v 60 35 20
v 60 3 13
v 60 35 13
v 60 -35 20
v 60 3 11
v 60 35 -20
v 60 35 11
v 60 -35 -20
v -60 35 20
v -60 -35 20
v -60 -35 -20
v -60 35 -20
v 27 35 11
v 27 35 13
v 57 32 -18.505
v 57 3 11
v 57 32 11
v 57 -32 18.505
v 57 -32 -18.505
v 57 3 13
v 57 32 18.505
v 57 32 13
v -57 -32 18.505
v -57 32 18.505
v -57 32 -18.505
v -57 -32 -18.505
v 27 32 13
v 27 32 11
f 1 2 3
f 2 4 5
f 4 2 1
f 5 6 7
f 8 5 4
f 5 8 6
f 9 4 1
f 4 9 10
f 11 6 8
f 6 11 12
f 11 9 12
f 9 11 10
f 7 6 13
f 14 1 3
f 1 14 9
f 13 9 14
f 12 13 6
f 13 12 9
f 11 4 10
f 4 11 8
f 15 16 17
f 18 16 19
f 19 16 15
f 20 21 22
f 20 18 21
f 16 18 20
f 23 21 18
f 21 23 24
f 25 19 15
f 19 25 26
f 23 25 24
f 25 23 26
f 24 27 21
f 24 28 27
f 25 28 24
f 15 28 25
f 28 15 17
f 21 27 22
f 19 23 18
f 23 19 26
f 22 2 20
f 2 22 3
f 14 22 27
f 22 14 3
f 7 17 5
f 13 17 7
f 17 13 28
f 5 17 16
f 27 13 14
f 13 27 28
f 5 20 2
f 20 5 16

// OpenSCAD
// Buffer tank for mini horizontal gel-electrophoresis box
outer_X = 120;          // Outer length (X)
outer_Y = 70;           // Outer width (Y)
outer_Z = 40;           // Outer height (Z)
wall_thick = 3;         // Wall thickness
floor_thick = 3;        // Floor thickness
platform_X = 60;        // Platform length in X
platform_top_z = 13;    // Platform top Z position
platform_thick = 2;     // Platform thickness
hole_dia = 2;           // Electrode wire hole diameter
hole_z = 30;            // Electrode wire hole Z position

inner_X = outer_X - 2 * wall_thick;
inner_Y = outer_Y - 2 * wall_thick;
inner_Z = outer_Z - floor_thick;
platform_Y = inner_Y;

platform_start_x = (inner_X - platform_X) / 2;
platform_start_y = wall_thick;
platform_start_z = platform_top_z - platform_thick;

difference() {
    // Outer shape (centered on origin)
    cube([outer_X, outer_Y, outer_Z], center=true);
    
    // Inner cavity (centered on origin)
    cube([inner_X, inner_Y, inner_Z + 0.01], center=true);
    
    // Platform
    translate([platform_start_x, platform_start_y, platform_start_z]) {
        cube([platform_X, platform_Y, platform_thick]);
    }
    
    // Electrode wire holes
    translate([0, 0, hole_z]) {
        rotate([90, 0, 0]) {
            cylinder(d = hole_dia, h = outer_X + 1, $fn = 64);
        }
    }
}
